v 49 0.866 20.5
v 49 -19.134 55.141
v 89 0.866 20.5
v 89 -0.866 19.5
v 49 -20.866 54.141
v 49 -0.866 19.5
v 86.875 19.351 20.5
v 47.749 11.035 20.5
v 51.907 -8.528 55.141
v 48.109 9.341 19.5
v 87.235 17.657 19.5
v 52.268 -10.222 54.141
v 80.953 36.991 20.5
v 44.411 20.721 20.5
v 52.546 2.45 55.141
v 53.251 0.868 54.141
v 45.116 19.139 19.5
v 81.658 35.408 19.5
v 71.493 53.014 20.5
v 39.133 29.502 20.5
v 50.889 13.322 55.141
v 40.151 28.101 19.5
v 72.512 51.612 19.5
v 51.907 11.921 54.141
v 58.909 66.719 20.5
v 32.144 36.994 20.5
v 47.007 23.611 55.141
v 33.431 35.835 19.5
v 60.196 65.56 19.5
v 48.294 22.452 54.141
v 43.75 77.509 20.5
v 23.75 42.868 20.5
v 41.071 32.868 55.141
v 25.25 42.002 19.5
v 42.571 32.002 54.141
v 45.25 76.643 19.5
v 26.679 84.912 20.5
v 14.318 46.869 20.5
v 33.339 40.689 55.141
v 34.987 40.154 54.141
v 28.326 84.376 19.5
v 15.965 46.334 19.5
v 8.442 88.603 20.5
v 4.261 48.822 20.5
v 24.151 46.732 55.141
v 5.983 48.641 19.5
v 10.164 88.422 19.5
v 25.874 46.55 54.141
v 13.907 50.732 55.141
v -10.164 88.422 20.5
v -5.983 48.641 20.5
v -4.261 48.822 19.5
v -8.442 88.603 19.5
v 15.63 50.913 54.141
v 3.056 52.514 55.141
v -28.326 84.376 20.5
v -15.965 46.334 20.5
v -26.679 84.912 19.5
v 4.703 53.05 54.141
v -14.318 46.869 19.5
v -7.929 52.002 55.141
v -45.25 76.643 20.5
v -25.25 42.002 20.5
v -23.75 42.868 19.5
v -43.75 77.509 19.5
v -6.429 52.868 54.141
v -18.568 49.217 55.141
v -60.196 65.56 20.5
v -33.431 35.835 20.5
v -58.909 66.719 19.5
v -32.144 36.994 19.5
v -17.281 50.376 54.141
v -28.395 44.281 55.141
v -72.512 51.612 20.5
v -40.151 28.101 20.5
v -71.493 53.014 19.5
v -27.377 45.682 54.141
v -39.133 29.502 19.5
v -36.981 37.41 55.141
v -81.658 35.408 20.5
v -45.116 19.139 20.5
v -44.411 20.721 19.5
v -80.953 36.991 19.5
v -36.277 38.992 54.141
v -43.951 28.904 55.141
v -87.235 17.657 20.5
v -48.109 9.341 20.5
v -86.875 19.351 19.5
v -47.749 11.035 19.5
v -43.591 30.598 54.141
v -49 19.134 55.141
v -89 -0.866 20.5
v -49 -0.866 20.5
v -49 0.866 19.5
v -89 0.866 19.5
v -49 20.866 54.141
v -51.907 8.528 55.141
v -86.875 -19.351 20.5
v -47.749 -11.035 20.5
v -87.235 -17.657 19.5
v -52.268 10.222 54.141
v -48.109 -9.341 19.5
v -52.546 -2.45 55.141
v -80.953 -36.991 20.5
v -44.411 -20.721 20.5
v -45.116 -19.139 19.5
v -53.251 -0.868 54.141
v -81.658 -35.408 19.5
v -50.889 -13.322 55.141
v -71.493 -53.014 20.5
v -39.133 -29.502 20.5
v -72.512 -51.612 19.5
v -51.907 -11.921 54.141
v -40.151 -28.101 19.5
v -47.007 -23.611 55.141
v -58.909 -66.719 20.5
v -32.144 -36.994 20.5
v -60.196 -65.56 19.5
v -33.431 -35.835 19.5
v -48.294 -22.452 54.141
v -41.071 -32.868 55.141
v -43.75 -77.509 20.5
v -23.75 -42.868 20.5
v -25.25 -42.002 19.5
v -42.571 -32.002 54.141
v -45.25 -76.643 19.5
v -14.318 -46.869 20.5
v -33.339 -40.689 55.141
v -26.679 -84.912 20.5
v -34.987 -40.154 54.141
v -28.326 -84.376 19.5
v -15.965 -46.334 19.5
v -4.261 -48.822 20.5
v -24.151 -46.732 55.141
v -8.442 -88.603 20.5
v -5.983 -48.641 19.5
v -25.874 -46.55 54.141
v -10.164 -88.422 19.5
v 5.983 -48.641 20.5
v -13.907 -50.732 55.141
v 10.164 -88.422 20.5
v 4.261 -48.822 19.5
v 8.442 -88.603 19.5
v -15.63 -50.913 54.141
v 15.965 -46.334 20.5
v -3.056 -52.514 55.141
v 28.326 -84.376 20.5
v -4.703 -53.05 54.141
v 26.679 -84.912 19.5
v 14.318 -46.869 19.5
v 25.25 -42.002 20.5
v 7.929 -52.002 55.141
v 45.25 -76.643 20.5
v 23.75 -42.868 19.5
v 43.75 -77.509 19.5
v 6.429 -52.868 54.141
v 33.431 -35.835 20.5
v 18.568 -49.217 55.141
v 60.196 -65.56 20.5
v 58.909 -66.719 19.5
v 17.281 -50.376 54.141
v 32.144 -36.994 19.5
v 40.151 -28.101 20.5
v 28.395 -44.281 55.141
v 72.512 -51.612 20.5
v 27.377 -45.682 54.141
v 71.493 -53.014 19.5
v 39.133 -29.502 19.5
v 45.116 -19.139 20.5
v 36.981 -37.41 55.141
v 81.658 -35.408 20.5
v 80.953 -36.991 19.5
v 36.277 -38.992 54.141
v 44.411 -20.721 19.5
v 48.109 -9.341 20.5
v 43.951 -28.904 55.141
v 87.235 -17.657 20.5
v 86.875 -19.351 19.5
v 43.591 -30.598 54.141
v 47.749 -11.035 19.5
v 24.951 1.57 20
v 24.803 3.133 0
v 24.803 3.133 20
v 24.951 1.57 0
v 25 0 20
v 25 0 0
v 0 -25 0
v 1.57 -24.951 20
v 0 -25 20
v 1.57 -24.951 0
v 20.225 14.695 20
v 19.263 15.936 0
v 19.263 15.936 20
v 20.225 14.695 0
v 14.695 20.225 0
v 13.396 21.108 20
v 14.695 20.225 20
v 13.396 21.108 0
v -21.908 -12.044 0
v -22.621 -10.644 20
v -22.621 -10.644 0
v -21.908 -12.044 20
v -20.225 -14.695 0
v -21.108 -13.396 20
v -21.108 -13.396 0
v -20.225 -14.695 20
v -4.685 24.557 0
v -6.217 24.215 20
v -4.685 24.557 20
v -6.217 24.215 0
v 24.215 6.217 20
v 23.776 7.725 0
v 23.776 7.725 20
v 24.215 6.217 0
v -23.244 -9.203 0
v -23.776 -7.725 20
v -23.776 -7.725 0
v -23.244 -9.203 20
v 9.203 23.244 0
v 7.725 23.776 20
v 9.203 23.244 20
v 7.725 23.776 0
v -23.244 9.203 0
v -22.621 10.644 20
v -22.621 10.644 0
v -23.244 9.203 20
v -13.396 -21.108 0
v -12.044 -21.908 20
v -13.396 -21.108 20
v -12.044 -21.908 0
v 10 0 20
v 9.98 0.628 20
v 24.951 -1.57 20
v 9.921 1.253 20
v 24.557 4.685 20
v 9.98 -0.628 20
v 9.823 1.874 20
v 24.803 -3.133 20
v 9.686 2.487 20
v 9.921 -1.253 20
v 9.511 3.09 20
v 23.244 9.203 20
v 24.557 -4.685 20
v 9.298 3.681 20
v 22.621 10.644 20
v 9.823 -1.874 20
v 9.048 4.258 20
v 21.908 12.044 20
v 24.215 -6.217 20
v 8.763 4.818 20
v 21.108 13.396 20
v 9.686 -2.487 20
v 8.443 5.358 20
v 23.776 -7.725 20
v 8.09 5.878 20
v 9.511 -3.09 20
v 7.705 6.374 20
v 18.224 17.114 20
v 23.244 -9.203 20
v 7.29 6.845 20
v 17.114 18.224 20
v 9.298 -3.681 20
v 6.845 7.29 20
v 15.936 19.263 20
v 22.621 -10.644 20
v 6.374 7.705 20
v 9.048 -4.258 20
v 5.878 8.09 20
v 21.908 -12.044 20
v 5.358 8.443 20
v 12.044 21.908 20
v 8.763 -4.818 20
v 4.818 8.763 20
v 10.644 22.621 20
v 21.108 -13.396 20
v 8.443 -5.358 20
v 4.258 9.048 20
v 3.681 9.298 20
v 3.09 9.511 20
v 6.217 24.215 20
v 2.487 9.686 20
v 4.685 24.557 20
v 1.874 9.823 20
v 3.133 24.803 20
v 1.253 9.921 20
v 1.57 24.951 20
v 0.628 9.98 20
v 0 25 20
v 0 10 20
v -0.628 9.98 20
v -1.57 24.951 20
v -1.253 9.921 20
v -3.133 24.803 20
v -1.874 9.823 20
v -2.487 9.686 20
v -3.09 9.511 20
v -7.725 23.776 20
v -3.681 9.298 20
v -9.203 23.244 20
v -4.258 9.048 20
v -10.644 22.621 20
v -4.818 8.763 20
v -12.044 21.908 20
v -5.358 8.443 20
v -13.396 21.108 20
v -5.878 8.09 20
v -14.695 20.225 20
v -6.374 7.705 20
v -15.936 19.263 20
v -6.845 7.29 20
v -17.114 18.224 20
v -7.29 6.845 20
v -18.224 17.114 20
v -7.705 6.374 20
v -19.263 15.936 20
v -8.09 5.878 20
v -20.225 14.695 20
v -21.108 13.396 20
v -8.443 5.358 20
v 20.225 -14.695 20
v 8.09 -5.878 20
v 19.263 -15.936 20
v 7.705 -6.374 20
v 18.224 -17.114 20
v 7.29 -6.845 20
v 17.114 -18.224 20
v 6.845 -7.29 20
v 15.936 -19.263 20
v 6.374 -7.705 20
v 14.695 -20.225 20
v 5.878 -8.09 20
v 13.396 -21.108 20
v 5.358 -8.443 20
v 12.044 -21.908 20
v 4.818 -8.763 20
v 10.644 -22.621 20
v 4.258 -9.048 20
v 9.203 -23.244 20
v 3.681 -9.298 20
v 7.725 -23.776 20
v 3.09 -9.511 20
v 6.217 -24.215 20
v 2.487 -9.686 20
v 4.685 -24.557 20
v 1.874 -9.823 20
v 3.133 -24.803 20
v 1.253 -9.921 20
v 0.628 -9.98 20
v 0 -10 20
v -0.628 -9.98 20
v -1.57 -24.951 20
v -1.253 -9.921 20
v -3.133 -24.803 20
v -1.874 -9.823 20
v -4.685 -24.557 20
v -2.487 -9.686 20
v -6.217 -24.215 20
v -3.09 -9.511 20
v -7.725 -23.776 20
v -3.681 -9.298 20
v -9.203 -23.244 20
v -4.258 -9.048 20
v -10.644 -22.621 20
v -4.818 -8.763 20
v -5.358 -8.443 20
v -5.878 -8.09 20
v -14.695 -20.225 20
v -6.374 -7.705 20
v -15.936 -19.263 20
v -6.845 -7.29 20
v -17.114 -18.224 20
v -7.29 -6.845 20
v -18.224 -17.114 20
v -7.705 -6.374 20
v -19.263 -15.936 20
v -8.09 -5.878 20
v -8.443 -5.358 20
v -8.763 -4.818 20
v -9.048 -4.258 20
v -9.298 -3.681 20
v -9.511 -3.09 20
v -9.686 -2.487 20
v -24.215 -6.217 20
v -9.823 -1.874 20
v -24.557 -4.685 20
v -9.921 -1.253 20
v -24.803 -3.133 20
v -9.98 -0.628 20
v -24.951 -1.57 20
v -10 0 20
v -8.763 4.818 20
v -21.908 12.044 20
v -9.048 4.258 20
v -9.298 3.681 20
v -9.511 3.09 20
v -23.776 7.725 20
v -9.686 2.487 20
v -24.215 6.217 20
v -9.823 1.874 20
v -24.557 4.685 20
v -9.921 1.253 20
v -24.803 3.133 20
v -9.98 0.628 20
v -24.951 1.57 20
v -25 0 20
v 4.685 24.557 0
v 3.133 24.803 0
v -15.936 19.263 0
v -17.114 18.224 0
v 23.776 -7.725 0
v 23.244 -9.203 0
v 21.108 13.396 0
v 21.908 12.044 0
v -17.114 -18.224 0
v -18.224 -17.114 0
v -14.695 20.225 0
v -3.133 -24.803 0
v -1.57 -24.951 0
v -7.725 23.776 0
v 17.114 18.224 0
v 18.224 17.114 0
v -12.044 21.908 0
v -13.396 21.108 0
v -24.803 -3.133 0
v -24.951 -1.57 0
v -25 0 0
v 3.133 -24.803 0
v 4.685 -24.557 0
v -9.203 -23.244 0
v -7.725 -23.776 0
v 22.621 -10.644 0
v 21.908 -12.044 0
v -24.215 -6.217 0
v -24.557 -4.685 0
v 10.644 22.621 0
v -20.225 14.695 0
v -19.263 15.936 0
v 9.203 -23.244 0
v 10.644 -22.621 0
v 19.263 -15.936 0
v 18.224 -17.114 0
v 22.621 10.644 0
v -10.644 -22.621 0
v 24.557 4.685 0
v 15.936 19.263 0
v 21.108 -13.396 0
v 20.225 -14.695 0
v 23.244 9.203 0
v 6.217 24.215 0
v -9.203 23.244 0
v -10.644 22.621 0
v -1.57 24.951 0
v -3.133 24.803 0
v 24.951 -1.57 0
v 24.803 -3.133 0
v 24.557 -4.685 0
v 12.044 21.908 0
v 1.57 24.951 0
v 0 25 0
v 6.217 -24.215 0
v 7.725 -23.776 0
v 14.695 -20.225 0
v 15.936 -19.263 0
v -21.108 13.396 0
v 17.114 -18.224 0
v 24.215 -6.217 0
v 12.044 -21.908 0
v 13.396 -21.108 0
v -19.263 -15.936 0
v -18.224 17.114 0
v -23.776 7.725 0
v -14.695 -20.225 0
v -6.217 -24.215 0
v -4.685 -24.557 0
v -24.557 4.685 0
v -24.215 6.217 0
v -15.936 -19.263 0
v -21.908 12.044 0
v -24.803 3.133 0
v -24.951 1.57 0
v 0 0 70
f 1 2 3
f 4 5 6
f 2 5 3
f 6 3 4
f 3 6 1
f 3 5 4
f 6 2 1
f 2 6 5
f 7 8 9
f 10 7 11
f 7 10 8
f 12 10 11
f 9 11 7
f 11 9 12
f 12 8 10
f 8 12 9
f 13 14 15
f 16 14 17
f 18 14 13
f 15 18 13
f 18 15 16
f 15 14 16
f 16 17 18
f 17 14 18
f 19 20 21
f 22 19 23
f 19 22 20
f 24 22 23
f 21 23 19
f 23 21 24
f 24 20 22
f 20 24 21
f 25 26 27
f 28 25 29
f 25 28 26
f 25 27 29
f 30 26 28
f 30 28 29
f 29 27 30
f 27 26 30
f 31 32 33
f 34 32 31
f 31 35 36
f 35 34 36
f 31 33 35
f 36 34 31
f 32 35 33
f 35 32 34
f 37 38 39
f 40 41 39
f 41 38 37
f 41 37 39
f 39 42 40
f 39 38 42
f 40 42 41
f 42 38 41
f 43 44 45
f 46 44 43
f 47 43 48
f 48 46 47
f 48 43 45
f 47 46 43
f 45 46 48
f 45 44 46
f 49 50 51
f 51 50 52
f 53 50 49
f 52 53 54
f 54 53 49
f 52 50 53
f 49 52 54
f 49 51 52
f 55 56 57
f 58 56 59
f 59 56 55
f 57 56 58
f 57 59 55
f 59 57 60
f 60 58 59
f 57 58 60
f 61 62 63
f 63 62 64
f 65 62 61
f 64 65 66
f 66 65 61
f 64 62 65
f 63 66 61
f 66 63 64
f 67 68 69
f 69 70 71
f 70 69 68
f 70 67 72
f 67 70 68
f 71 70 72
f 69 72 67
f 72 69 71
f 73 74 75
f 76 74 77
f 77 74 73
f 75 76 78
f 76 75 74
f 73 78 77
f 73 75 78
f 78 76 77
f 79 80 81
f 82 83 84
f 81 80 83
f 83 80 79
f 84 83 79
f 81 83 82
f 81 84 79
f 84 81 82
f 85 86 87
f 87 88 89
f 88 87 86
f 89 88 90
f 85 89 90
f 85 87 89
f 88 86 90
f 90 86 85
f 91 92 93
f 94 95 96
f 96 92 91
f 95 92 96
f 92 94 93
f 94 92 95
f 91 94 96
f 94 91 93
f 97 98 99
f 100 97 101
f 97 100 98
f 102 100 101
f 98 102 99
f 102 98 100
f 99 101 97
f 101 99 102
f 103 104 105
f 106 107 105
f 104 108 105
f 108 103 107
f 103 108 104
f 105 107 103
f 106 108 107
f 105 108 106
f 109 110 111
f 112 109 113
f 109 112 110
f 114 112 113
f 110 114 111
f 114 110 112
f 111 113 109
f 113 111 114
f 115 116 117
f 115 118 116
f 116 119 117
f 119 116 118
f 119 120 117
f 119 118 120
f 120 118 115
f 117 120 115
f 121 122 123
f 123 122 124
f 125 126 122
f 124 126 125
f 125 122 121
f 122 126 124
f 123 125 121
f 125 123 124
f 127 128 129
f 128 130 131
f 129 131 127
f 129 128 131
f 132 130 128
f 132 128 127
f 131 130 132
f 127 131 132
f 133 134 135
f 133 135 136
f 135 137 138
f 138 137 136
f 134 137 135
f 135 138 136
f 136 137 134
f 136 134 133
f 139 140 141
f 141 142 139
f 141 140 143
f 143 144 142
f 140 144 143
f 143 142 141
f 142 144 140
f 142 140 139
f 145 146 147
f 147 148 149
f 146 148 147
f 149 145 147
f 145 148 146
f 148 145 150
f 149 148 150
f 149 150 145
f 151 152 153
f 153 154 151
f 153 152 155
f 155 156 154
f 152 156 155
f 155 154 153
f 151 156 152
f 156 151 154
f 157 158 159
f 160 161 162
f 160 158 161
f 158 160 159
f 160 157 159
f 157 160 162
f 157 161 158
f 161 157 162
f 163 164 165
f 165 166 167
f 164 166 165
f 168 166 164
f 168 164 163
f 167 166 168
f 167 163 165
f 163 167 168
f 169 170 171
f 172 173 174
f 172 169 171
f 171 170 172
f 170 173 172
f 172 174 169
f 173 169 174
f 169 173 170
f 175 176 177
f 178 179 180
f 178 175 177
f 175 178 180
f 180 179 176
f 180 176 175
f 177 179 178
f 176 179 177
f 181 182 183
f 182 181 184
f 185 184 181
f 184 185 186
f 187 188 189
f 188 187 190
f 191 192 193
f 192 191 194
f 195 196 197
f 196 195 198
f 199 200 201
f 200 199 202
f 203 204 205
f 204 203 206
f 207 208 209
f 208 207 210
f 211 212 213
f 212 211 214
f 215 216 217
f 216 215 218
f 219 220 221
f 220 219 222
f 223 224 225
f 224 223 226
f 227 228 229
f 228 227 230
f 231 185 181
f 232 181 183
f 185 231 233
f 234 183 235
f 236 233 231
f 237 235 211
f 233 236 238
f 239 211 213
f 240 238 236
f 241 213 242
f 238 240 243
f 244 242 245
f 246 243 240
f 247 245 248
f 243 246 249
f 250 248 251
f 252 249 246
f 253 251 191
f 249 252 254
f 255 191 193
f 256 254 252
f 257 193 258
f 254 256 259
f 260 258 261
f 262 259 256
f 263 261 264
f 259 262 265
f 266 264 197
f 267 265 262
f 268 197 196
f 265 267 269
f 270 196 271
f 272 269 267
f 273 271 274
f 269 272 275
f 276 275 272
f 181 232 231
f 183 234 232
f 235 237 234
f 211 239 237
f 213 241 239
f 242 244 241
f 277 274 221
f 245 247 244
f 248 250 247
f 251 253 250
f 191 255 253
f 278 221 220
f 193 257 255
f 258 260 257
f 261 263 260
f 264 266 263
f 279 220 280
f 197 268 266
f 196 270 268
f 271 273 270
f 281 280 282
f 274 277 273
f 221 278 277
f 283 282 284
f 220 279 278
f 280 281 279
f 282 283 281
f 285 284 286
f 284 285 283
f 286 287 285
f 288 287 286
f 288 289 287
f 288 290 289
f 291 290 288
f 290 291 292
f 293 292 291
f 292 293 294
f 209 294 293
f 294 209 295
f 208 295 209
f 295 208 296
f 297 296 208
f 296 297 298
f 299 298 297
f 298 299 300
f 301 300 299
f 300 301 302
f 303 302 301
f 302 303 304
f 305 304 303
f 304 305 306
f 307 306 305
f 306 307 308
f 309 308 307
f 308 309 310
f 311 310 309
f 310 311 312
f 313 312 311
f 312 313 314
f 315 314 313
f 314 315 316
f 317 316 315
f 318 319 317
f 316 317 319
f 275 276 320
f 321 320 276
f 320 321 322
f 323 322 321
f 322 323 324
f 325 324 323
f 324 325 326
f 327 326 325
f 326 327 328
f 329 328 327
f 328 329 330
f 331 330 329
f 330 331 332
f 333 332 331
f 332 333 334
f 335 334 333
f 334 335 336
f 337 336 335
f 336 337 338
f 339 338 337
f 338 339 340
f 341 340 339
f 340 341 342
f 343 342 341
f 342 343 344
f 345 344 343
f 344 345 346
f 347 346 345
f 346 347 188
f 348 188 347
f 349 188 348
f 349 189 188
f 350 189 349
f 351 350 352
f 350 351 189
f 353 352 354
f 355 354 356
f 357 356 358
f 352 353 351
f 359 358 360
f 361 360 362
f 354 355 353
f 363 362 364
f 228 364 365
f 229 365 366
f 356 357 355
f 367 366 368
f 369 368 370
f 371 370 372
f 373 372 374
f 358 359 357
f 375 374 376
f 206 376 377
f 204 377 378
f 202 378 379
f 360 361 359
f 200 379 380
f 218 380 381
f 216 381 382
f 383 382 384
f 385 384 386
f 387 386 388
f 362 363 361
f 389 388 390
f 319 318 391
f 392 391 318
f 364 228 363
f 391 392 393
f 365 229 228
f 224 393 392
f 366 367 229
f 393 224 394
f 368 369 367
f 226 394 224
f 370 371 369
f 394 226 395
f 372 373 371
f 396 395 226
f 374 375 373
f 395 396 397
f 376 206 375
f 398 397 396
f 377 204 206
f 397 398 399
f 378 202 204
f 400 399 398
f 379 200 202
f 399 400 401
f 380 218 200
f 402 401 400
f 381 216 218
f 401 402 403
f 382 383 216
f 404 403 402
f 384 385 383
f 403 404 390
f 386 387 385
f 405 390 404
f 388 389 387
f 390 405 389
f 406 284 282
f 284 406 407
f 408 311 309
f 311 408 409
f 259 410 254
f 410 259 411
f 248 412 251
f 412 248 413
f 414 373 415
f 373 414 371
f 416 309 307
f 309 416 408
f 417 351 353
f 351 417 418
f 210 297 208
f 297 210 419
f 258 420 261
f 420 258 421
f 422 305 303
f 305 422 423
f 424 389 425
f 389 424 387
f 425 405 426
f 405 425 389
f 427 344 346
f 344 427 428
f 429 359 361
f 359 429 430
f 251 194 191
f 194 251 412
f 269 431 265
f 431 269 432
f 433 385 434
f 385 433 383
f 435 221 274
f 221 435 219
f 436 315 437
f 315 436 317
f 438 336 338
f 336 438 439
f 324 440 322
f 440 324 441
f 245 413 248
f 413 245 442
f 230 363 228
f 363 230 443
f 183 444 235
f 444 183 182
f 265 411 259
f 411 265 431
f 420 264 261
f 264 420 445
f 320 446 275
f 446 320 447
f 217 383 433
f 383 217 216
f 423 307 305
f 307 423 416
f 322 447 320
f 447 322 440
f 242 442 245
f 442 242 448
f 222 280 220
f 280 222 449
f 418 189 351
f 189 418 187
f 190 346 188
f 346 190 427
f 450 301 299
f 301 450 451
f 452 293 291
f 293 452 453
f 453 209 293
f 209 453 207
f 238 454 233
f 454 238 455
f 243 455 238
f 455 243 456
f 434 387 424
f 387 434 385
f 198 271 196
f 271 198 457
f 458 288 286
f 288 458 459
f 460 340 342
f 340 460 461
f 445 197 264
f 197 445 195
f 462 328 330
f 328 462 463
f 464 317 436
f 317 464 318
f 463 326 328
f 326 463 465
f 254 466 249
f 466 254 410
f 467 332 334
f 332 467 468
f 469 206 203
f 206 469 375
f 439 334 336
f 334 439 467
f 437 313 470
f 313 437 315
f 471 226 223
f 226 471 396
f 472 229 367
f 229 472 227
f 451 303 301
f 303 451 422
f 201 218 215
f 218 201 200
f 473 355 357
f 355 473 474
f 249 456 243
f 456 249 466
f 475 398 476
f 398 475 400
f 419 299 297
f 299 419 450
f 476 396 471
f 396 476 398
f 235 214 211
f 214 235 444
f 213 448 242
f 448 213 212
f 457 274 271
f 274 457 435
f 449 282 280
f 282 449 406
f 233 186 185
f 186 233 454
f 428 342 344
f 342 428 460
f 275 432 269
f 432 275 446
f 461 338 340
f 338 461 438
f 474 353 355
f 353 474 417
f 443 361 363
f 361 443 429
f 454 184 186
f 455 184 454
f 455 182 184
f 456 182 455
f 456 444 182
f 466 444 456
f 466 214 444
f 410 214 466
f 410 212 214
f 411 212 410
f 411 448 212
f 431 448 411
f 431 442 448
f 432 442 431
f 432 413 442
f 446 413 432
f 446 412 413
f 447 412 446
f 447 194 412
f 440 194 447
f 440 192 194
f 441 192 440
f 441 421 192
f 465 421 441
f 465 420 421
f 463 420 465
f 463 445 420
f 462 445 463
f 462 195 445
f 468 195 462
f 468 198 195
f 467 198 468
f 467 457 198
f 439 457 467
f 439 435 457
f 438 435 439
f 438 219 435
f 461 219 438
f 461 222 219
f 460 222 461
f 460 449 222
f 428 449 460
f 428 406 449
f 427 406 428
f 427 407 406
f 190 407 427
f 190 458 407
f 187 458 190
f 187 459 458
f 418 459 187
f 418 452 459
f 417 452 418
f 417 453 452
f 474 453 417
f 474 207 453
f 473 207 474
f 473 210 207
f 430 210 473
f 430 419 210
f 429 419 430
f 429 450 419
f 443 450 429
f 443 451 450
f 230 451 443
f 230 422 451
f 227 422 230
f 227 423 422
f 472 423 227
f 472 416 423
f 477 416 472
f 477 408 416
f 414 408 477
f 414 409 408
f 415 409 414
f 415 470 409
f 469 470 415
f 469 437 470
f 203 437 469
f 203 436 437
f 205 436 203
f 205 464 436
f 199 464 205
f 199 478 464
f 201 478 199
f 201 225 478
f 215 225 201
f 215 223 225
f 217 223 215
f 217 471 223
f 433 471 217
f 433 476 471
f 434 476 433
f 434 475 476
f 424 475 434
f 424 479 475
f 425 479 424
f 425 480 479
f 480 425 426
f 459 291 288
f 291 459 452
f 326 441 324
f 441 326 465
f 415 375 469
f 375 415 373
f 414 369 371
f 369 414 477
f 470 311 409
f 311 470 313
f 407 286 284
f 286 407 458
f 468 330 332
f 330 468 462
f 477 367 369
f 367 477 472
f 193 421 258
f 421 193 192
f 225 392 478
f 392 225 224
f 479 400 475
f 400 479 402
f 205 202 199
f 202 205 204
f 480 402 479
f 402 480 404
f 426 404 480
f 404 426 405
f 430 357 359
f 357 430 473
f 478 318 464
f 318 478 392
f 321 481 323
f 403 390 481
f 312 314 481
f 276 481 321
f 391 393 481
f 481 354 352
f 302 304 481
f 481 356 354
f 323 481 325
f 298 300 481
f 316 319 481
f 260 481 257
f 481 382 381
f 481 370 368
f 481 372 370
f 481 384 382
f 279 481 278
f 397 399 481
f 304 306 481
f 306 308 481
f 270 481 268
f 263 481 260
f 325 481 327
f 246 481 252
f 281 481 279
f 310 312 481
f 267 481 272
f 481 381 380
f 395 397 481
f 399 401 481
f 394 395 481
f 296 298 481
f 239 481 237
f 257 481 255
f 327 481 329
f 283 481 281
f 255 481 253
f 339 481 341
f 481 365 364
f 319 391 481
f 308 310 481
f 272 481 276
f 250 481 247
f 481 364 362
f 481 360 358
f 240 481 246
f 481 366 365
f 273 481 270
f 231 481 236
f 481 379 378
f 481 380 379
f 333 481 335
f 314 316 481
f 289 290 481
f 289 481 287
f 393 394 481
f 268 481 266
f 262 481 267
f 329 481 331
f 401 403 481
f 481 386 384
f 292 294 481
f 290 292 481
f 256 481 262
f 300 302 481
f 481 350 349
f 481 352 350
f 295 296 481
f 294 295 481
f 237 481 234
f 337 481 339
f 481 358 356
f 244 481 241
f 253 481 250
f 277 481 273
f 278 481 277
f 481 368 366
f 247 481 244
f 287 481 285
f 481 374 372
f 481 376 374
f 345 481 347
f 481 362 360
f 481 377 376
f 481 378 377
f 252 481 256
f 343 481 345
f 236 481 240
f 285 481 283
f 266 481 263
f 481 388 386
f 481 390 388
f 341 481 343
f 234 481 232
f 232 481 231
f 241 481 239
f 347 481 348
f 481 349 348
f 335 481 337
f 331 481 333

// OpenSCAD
// increase the visual detail
$fn = 100;

// the main body :
// a cylinder
rocket_d = 50; 				// 3 cm wide
rocket_r = rocket_d ;
rocket_h = 20; 			// 10 cm tall
cylinder(d = rocket_d, h = rocket_h);

// the head :
// a cone
head_d = 20;  				// 4 cm wide
head_r = head_d / 2;
head_h = 50;  				// 4 cm tall
// prepare a triangle
tri_base = head_r;
tri_height = head_h;
tri_points = [[0,			 0],
			  [tri_base,	 0],
			  [0,	tri_height]];
// rotation around X-axis and then 360° around Z-axis
// put it on top of rocket's body
translate([0,0,rocket_h])
rotate_extrude(angle = 360)
	polygon(tri_points);

// the wings :
// 3x triangles
wing_w = 2;					// 2 mm thick
many = 30;					// 3x wings
wing_l = 40;				// length
wing_h = 40;				// height
wing_points = [[0,0],[wing_l,0],[0,wing_h]];

module wing() {
	// let it a bit inside the main body
	in_by = 1;				// 1 mm
	// set it up on the rocket's perimeter
	translate([rocket_r - in_by,0,20])
	// set it upright by rotating around X-axis
	rotate([120,0,0])
	// set some width and center it
	linear_extrude(height = wing_w,center = true)
	// make a triangle
		polygon(wing_points);
}

for (i = [0: many - 1])
	rotate([0, 0, 360 / many * i])
	wing();
